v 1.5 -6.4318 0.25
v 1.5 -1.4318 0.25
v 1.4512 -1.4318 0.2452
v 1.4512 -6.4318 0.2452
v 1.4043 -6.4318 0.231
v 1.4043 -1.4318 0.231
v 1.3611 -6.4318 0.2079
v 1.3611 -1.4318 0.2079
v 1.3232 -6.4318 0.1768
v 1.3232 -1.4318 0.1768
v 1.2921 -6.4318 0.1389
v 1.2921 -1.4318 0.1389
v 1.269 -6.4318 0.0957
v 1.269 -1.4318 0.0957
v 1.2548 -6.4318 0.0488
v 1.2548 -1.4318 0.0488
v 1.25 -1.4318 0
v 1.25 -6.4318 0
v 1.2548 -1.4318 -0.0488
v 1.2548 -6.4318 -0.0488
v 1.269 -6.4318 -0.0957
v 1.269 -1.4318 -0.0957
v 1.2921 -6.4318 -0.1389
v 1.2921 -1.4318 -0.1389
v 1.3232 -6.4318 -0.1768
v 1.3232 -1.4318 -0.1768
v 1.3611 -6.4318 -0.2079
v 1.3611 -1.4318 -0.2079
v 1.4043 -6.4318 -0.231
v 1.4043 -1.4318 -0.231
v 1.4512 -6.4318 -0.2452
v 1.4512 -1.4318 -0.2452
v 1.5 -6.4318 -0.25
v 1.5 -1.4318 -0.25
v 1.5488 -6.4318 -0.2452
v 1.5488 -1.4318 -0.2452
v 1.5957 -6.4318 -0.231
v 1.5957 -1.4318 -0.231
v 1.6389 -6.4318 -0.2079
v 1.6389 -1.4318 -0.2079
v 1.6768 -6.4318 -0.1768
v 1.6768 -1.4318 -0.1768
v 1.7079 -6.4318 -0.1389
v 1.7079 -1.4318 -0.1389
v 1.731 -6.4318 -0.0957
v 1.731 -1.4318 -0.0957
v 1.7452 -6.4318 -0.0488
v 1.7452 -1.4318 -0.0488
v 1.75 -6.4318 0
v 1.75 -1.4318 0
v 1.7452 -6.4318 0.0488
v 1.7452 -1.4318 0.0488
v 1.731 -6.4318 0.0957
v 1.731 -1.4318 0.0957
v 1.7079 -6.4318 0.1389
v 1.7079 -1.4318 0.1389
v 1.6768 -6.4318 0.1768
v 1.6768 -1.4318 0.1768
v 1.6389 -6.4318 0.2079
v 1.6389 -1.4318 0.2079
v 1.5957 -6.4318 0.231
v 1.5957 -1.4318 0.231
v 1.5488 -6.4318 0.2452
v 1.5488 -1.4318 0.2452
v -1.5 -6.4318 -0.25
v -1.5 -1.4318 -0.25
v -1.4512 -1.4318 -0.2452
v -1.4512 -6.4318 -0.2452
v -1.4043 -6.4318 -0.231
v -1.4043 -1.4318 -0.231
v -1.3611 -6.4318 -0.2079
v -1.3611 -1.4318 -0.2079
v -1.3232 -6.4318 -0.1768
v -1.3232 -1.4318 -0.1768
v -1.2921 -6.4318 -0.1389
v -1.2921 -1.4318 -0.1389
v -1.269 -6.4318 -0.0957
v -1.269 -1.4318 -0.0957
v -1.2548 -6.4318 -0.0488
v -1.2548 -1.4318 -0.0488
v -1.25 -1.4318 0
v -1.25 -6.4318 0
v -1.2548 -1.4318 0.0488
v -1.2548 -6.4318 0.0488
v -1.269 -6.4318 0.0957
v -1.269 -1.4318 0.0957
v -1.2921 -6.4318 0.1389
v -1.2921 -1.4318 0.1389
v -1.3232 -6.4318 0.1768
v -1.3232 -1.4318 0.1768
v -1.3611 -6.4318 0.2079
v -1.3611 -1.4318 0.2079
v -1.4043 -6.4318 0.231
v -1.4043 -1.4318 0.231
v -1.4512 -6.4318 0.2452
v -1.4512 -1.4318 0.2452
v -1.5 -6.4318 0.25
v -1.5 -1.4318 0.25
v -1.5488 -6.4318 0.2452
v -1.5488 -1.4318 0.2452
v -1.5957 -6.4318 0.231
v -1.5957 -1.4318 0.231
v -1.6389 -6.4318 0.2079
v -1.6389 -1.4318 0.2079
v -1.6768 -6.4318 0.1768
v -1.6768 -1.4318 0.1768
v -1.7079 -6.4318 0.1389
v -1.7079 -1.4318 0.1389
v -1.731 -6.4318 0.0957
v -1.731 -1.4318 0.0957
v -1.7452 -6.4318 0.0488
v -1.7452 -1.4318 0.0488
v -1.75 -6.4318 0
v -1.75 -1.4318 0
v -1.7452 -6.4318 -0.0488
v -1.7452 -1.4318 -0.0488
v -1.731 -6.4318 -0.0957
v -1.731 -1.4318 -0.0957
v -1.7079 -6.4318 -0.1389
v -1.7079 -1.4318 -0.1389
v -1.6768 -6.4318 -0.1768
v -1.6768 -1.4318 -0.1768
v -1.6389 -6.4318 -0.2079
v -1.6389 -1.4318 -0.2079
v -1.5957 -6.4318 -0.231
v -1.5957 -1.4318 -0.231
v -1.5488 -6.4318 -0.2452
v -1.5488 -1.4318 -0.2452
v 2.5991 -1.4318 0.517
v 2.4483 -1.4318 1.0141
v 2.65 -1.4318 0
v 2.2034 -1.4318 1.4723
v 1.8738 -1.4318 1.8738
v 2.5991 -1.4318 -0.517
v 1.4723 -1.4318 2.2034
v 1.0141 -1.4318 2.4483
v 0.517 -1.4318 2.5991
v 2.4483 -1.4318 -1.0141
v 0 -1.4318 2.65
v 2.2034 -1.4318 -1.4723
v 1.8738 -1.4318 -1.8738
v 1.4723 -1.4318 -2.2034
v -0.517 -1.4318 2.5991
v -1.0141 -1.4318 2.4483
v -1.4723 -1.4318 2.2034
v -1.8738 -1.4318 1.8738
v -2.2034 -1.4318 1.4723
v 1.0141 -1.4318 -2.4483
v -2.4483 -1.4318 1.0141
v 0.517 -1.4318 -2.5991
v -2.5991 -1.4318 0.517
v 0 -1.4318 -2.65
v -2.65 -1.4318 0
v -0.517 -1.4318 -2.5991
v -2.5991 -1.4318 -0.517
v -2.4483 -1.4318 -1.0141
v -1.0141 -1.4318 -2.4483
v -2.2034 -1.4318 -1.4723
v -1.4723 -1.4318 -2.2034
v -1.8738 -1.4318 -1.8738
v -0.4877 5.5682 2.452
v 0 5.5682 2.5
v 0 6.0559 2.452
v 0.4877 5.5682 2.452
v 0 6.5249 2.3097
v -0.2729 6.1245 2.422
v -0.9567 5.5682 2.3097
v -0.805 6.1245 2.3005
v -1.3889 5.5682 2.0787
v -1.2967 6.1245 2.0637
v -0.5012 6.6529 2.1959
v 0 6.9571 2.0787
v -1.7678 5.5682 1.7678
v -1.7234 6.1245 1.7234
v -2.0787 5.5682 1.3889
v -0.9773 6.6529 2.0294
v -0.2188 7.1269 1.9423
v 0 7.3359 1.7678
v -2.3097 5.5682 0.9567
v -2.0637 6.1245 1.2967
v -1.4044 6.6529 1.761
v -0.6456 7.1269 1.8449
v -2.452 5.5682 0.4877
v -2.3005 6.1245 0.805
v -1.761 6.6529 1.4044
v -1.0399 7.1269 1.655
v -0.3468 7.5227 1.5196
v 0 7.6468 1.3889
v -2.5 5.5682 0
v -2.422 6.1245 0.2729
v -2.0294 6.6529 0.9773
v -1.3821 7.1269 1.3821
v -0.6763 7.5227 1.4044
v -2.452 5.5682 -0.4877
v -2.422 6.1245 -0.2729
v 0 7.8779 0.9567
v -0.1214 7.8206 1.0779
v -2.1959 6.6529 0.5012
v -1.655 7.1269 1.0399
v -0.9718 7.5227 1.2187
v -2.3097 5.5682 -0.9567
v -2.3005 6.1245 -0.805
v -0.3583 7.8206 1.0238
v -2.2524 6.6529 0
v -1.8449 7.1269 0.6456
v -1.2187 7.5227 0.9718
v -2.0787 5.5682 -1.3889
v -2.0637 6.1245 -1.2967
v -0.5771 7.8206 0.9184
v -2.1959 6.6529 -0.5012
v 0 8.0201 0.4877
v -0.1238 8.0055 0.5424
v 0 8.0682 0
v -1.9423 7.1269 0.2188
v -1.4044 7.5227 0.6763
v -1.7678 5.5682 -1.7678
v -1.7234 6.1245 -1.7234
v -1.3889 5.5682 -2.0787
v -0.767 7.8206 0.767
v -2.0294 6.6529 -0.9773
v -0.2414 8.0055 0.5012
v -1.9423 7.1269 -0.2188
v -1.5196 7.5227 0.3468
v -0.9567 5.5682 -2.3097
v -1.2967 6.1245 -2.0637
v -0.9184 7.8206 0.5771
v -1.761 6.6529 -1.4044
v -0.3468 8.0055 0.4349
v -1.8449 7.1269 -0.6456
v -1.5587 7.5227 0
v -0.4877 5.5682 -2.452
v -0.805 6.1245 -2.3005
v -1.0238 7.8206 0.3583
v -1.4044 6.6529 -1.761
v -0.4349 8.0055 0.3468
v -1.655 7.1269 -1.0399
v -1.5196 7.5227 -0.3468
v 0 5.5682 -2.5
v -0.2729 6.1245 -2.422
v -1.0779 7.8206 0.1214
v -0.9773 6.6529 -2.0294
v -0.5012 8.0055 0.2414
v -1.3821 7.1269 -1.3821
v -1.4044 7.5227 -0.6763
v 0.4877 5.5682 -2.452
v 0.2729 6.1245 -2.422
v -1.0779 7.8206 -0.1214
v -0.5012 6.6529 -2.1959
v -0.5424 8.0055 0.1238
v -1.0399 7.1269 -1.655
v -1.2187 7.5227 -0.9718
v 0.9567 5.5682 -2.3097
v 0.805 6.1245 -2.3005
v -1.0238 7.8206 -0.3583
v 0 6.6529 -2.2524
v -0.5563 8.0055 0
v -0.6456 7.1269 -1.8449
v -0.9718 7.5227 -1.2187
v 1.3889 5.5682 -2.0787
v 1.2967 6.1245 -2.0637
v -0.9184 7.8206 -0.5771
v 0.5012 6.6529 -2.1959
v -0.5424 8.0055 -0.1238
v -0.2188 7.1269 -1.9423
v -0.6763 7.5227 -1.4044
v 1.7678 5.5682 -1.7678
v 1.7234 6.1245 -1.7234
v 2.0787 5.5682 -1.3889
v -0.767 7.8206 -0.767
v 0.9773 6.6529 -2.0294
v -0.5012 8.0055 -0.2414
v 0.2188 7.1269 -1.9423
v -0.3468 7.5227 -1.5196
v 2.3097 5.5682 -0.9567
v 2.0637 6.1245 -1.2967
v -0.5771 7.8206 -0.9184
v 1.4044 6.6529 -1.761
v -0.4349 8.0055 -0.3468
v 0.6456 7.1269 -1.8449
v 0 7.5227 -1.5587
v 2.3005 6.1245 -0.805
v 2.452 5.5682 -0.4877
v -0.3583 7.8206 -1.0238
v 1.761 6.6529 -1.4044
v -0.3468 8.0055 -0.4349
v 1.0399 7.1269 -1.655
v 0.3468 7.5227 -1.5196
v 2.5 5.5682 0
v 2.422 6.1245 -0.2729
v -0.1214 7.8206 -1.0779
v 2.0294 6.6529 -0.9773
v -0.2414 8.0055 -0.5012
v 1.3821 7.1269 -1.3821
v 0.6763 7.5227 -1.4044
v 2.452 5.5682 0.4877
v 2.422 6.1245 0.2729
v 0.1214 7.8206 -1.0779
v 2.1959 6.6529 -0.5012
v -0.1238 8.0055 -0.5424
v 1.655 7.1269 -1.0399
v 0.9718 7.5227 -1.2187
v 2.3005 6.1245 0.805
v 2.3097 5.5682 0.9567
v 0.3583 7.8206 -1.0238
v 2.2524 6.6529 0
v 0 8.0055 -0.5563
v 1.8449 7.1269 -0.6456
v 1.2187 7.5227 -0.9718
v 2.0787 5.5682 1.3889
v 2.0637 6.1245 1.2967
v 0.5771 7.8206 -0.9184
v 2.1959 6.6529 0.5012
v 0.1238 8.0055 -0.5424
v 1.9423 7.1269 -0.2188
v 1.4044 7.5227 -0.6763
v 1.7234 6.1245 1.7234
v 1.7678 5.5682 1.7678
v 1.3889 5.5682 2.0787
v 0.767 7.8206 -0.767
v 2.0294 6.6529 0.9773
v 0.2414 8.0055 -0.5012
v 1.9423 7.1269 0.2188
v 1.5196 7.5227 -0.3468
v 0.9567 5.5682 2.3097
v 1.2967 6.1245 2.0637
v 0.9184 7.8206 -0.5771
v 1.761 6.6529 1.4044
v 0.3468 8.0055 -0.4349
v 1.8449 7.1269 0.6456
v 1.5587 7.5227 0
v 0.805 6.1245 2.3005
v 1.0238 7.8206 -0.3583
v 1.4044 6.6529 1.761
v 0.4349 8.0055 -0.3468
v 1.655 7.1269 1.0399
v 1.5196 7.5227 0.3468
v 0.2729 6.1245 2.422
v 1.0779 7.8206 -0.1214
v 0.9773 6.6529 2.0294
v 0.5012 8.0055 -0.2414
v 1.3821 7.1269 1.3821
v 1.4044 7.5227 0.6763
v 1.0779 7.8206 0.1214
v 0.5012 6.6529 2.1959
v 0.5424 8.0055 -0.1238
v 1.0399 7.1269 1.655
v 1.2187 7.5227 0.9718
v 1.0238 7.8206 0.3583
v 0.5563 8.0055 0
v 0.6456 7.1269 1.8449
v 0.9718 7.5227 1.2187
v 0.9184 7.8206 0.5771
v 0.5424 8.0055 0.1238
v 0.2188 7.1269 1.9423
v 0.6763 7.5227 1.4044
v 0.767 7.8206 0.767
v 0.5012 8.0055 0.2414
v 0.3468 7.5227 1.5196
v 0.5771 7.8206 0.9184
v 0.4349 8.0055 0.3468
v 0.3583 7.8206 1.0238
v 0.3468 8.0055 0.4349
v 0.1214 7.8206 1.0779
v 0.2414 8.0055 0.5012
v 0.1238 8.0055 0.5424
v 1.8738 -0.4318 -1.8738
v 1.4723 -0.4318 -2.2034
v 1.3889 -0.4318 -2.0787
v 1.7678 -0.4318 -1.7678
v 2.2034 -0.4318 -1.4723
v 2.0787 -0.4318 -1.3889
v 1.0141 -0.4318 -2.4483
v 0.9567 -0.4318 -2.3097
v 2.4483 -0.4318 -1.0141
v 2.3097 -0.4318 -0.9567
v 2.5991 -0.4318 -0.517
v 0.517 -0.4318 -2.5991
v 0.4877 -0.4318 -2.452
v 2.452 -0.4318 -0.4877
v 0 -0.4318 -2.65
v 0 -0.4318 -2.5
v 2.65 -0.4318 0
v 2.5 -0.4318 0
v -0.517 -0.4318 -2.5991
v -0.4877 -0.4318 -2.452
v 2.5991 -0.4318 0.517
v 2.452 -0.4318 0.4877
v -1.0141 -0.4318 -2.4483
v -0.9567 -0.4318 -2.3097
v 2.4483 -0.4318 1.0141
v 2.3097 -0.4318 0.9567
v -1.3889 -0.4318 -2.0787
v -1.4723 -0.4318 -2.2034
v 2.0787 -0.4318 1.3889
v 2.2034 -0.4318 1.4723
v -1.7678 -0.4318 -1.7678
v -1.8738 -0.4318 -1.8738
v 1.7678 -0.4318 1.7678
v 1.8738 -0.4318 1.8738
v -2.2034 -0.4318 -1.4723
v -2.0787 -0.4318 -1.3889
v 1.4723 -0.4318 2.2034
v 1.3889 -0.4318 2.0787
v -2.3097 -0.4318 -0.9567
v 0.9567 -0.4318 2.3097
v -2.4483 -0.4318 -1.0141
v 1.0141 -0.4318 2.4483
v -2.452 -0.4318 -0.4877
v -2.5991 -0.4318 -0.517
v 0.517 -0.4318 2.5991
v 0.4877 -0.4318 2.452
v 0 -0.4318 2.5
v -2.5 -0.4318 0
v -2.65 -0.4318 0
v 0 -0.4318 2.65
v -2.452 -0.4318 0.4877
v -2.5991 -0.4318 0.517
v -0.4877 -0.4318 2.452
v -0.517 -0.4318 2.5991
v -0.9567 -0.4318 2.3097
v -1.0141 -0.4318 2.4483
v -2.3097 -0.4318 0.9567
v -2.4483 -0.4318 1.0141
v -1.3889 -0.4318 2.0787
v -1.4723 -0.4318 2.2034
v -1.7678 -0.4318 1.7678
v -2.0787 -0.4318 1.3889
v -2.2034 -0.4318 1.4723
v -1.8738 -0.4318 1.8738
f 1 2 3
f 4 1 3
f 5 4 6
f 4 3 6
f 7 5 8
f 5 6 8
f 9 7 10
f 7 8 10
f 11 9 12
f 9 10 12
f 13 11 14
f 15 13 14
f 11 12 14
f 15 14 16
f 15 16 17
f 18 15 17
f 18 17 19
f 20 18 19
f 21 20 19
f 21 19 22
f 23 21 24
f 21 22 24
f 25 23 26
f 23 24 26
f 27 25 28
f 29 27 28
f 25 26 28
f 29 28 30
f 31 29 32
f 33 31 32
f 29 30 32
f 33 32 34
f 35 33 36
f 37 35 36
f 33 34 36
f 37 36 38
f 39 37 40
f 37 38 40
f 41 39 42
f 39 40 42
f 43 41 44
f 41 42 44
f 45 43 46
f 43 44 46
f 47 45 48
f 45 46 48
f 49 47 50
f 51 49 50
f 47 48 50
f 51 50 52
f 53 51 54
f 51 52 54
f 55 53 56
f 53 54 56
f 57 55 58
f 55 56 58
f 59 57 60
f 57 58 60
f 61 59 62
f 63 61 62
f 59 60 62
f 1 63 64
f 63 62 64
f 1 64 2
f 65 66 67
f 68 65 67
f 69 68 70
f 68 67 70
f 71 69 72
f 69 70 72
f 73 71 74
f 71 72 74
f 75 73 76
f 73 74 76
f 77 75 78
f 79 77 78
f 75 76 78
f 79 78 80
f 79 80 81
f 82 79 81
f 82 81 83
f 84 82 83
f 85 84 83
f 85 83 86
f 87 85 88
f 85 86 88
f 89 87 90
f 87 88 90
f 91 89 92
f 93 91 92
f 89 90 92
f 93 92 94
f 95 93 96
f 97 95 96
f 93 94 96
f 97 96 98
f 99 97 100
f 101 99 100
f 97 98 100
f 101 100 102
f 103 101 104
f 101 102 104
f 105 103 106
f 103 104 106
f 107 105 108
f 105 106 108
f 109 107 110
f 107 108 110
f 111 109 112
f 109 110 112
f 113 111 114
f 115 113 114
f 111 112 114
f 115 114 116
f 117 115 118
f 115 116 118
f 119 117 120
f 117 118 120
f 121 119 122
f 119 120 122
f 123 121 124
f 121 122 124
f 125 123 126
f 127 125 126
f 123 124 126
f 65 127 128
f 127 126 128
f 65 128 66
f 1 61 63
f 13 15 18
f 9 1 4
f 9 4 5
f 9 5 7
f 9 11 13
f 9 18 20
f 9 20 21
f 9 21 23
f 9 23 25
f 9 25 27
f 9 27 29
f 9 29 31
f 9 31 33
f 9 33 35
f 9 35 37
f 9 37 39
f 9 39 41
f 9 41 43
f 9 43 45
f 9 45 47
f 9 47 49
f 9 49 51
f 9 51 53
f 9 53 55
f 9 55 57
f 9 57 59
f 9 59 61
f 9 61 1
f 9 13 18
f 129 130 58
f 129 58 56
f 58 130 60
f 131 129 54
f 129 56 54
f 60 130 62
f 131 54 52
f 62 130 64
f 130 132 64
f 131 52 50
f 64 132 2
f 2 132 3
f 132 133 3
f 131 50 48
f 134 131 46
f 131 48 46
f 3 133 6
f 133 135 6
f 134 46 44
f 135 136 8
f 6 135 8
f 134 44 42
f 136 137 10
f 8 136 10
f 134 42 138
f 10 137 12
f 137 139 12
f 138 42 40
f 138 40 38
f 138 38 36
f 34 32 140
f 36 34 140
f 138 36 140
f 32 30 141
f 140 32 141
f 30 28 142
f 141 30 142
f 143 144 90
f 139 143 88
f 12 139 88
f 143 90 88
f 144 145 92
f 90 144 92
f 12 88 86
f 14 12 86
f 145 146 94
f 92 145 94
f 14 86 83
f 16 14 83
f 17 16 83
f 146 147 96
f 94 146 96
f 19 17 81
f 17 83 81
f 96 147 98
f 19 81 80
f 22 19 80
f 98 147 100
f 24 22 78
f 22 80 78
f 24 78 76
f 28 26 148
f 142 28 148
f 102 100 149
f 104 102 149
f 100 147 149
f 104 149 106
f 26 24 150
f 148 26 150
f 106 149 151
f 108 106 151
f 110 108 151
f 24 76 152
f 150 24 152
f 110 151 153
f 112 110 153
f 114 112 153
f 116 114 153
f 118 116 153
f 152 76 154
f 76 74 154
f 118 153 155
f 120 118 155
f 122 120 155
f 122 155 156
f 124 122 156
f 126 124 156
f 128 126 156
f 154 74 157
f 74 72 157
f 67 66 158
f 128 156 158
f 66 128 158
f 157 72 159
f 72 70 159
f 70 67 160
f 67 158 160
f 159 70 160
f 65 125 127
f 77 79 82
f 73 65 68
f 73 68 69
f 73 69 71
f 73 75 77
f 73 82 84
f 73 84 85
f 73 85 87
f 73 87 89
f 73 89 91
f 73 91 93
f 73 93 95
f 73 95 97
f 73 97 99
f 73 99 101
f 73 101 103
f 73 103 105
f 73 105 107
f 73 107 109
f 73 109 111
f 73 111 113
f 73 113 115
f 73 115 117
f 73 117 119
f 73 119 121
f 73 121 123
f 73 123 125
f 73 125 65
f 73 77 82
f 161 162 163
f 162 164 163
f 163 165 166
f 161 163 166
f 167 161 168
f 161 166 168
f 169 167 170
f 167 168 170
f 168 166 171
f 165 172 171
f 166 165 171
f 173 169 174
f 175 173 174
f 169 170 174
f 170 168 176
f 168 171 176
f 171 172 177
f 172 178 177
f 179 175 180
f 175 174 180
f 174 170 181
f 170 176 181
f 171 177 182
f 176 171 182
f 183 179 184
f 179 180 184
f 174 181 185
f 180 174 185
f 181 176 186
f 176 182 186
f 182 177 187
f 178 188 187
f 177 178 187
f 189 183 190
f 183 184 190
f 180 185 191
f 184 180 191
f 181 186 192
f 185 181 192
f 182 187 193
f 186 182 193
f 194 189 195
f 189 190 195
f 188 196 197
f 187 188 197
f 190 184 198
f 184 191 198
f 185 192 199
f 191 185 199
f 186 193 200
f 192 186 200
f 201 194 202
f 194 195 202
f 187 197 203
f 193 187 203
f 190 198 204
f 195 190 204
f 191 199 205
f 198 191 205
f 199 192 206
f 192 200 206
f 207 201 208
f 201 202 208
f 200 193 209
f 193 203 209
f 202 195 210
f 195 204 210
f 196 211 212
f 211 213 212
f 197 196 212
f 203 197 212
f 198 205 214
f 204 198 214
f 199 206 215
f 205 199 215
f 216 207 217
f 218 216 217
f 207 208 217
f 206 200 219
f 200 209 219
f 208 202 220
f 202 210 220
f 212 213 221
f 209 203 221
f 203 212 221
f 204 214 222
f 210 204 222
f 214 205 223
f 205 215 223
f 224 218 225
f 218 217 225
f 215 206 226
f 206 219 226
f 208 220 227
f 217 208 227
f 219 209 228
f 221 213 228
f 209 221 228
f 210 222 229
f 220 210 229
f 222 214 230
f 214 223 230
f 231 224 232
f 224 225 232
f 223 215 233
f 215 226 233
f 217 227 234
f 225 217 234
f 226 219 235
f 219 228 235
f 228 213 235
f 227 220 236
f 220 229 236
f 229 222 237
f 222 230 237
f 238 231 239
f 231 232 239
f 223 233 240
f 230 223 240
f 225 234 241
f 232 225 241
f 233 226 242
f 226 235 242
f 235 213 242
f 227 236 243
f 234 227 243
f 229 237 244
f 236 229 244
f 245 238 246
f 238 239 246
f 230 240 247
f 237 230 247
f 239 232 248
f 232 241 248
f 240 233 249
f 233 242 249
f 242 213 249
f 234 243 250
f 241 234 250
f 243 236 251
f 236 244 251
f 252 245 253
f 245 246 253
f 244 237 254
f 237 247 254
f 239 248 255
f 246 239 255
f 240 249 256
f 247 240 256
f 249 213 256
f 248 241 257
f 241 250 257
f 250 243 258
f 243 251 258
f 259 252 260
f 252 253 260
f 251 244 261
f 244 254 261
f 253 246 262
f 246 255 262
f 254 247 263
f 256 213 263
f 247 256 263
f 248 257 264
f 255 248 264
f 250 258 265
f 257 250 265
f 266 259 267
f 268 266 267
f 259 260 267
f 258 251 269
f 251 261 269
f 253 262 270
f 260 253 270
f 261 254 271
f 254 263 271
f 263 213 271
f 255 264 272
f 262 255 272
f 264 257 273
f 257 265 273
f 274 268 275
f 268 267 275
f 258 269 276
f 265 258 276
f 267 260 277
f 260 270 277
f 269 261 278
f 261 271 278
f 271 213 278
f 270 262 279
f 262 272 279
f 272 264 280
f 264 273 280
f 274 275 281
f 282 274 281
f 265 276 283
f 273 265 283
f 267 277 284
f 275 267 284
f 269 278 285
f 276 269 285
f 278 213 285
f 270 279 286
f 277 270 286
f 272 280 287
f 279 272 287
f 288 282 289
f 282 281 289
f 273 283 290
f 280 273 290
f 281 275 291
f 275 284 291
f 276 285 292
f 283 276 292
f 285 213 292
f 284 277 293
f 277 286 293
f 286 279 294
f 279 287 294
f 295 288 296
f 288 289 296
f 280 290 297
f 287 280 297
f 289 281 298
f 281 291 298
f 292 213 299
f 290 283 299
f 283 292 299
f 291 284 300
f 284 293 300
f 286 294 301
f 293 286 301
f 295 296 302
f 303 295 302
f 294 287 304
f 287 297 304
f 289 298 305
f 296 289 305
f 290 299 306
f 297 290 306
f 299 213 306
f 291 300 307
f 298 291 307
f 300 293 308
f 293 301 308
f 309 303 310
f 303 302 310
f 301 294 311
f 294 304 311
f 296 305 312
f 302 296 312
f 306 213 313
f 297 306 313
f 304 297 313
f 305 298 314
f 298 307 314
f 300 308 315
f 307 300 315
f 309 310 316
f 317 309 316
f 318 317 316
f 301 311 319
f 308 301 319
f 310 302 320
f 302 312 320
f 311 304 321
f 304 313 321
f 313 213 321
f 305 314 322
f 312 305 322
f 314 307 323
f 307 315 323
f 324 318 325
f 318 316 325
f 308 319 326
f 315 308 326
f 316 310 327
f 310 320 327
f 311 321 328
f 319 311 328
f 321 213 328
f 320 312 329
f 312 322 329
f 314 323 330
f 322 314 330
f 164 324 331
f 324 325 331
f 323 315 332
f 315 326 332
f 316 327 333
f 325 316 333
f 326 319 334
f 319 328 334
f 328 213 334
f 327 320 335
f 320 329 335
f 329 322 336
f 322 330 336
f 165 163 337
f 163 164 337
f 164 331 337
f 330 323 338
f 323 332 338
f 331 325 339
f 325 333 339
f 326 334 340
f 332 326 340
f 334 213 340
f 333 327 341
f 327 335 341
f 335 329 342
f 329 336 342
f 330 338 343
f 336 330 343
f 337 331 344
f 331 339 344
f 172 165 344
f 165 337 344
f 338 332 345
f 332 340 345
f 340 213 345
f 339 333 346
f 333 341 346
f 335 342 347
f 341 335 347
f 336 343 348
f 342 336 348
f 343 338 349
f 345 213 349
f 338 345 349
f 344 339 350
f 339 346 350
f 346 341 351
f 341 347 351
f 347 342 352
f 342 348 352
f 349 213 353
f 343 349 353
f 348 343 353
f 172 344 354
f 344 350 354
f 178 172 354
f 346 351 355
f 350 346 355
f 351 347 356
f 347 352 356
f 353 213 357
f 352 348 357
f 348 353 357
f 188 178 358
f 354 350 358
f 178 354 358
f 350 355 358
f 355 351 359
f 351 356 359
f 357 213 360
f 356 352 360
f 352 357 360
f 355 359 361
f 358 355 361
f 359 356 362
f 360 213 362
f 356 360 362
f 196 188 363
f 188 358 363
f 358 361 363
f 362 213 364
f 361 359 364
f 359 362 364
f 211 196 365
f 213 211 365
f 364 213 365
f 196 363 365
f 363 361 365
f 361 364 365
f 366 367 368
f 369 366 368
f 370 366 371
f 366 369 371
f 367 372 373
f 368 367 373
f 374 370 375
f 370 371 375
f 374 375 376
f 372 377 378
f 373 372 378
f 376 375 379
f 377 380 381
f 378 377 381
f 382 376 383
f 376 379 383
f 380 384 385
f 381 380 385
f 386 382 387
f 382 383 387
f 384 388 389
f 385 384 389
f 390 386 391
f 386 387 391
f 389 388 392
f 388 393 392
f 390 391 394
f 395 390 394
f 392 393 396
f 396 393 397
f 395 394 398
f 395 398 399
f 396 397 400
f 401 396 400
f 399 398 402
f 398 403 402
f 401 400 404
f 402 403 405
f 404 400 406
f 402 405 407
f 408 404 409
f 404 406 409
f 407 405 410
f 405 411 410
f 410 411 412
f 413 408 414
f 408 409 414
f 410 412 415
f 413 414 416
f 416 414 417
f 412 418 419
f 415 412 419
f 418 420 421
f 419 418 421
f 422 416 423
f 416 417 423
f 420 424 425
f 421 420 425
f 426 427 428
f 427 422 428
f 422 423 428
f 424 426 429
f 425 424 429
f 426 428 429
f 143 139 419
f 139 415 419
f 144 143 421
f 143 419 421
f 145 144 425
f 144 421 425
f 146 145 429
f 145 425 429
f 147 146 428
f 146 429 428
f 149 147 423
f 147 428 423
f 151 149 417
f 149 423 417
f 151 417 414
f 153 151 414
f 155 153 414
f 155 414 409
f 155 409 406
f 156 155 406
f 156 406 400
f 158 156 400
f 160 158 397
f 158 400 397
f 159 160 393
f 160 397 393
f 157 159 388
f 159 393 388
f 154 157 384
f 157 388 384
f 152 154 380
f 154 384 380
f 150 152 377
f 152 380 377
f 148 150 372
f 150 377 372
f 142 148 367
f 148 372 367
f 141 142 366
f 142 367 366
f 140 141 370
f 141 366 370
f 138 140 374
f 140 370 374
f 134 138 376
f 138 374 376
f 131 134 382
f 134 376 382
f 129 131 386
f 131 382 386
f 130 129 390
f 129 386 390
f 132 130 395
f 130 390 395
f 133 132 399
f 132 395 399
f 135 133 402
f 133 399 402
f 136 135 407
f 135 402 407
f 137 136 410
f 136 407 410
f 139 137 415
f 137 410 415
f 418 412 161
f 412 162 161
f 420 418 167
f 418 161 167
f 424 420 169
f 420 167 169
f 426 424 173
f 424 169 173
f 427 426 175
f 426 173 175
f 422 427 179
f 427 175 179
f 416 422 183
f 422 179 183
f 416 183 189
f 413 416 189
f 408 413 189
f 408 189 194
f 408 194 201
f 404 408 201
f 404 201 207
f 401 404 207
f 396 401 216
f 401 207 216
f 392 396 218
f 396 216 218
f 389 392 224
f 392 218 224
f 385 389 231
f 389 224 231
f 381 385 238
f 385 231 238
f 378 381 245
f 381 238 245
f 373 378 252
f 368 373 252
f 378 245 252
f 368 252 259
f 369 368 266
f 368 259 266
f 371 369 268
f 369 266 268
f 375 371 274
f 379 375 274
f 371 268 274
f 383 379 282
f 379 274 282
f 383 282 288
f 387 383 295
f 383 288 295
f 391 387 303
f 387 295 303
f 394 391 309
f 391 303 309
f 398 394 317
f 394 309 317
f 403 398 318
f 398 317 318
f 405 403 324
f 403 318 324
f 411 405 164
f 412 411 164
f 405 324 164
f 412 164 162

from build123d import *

# Parameters (mm, degrees)
SKETCH2_R           = 0.25
BOSS_EXTRUDE1_DEPTH = 5


with BuildPart() as part:
    # Sketch1 → Revolve1 (revolve)
    with BuildSketch(Plane(origin=(0, 0, 0), x_dir=(0, 0, -1), z_dir=(1, 0, 0))):
        with BuildLine():
            Line((-2.5, -0.431829007), (-2.5, 5.568170993))
            ThreePointArc((-2.5, 5.568170993), (-1.767766953, 7.335937946), (0, 8.068170993))
            Line((0, 8.068170993), (0, 1.631287774))
            Line((0, 1.631287774), (0, -1.431829007))
            Line((0, -1.431829007), (-2.65, -1.431829007))
            Line((-2.65, -1.431829007), (-2.65, -0.431829007))
            Line((-2.65, -0.431829007), (-2.5, -0.431829007))
        make_face()
    revolve(axis=Axis((0, 8.068170993, 0), (0, -1, 0)))

    # Sketch2 → Boss-Extrude1 (add)
    with BuildSketch(Plane.XZ.offset(1.431829007)):
        with Locations(Location((-1.5, 0, 0), (0, 0, 270))):
            Circle(SKETCH2_R)
        with Locations(Location((1.5, 0, 0), (0, 0, 90))):
            Circle(SKETCH2_R)
    extrude(amount=BOSS_EXTRUDE1_DEPTH)


solid = part.part
